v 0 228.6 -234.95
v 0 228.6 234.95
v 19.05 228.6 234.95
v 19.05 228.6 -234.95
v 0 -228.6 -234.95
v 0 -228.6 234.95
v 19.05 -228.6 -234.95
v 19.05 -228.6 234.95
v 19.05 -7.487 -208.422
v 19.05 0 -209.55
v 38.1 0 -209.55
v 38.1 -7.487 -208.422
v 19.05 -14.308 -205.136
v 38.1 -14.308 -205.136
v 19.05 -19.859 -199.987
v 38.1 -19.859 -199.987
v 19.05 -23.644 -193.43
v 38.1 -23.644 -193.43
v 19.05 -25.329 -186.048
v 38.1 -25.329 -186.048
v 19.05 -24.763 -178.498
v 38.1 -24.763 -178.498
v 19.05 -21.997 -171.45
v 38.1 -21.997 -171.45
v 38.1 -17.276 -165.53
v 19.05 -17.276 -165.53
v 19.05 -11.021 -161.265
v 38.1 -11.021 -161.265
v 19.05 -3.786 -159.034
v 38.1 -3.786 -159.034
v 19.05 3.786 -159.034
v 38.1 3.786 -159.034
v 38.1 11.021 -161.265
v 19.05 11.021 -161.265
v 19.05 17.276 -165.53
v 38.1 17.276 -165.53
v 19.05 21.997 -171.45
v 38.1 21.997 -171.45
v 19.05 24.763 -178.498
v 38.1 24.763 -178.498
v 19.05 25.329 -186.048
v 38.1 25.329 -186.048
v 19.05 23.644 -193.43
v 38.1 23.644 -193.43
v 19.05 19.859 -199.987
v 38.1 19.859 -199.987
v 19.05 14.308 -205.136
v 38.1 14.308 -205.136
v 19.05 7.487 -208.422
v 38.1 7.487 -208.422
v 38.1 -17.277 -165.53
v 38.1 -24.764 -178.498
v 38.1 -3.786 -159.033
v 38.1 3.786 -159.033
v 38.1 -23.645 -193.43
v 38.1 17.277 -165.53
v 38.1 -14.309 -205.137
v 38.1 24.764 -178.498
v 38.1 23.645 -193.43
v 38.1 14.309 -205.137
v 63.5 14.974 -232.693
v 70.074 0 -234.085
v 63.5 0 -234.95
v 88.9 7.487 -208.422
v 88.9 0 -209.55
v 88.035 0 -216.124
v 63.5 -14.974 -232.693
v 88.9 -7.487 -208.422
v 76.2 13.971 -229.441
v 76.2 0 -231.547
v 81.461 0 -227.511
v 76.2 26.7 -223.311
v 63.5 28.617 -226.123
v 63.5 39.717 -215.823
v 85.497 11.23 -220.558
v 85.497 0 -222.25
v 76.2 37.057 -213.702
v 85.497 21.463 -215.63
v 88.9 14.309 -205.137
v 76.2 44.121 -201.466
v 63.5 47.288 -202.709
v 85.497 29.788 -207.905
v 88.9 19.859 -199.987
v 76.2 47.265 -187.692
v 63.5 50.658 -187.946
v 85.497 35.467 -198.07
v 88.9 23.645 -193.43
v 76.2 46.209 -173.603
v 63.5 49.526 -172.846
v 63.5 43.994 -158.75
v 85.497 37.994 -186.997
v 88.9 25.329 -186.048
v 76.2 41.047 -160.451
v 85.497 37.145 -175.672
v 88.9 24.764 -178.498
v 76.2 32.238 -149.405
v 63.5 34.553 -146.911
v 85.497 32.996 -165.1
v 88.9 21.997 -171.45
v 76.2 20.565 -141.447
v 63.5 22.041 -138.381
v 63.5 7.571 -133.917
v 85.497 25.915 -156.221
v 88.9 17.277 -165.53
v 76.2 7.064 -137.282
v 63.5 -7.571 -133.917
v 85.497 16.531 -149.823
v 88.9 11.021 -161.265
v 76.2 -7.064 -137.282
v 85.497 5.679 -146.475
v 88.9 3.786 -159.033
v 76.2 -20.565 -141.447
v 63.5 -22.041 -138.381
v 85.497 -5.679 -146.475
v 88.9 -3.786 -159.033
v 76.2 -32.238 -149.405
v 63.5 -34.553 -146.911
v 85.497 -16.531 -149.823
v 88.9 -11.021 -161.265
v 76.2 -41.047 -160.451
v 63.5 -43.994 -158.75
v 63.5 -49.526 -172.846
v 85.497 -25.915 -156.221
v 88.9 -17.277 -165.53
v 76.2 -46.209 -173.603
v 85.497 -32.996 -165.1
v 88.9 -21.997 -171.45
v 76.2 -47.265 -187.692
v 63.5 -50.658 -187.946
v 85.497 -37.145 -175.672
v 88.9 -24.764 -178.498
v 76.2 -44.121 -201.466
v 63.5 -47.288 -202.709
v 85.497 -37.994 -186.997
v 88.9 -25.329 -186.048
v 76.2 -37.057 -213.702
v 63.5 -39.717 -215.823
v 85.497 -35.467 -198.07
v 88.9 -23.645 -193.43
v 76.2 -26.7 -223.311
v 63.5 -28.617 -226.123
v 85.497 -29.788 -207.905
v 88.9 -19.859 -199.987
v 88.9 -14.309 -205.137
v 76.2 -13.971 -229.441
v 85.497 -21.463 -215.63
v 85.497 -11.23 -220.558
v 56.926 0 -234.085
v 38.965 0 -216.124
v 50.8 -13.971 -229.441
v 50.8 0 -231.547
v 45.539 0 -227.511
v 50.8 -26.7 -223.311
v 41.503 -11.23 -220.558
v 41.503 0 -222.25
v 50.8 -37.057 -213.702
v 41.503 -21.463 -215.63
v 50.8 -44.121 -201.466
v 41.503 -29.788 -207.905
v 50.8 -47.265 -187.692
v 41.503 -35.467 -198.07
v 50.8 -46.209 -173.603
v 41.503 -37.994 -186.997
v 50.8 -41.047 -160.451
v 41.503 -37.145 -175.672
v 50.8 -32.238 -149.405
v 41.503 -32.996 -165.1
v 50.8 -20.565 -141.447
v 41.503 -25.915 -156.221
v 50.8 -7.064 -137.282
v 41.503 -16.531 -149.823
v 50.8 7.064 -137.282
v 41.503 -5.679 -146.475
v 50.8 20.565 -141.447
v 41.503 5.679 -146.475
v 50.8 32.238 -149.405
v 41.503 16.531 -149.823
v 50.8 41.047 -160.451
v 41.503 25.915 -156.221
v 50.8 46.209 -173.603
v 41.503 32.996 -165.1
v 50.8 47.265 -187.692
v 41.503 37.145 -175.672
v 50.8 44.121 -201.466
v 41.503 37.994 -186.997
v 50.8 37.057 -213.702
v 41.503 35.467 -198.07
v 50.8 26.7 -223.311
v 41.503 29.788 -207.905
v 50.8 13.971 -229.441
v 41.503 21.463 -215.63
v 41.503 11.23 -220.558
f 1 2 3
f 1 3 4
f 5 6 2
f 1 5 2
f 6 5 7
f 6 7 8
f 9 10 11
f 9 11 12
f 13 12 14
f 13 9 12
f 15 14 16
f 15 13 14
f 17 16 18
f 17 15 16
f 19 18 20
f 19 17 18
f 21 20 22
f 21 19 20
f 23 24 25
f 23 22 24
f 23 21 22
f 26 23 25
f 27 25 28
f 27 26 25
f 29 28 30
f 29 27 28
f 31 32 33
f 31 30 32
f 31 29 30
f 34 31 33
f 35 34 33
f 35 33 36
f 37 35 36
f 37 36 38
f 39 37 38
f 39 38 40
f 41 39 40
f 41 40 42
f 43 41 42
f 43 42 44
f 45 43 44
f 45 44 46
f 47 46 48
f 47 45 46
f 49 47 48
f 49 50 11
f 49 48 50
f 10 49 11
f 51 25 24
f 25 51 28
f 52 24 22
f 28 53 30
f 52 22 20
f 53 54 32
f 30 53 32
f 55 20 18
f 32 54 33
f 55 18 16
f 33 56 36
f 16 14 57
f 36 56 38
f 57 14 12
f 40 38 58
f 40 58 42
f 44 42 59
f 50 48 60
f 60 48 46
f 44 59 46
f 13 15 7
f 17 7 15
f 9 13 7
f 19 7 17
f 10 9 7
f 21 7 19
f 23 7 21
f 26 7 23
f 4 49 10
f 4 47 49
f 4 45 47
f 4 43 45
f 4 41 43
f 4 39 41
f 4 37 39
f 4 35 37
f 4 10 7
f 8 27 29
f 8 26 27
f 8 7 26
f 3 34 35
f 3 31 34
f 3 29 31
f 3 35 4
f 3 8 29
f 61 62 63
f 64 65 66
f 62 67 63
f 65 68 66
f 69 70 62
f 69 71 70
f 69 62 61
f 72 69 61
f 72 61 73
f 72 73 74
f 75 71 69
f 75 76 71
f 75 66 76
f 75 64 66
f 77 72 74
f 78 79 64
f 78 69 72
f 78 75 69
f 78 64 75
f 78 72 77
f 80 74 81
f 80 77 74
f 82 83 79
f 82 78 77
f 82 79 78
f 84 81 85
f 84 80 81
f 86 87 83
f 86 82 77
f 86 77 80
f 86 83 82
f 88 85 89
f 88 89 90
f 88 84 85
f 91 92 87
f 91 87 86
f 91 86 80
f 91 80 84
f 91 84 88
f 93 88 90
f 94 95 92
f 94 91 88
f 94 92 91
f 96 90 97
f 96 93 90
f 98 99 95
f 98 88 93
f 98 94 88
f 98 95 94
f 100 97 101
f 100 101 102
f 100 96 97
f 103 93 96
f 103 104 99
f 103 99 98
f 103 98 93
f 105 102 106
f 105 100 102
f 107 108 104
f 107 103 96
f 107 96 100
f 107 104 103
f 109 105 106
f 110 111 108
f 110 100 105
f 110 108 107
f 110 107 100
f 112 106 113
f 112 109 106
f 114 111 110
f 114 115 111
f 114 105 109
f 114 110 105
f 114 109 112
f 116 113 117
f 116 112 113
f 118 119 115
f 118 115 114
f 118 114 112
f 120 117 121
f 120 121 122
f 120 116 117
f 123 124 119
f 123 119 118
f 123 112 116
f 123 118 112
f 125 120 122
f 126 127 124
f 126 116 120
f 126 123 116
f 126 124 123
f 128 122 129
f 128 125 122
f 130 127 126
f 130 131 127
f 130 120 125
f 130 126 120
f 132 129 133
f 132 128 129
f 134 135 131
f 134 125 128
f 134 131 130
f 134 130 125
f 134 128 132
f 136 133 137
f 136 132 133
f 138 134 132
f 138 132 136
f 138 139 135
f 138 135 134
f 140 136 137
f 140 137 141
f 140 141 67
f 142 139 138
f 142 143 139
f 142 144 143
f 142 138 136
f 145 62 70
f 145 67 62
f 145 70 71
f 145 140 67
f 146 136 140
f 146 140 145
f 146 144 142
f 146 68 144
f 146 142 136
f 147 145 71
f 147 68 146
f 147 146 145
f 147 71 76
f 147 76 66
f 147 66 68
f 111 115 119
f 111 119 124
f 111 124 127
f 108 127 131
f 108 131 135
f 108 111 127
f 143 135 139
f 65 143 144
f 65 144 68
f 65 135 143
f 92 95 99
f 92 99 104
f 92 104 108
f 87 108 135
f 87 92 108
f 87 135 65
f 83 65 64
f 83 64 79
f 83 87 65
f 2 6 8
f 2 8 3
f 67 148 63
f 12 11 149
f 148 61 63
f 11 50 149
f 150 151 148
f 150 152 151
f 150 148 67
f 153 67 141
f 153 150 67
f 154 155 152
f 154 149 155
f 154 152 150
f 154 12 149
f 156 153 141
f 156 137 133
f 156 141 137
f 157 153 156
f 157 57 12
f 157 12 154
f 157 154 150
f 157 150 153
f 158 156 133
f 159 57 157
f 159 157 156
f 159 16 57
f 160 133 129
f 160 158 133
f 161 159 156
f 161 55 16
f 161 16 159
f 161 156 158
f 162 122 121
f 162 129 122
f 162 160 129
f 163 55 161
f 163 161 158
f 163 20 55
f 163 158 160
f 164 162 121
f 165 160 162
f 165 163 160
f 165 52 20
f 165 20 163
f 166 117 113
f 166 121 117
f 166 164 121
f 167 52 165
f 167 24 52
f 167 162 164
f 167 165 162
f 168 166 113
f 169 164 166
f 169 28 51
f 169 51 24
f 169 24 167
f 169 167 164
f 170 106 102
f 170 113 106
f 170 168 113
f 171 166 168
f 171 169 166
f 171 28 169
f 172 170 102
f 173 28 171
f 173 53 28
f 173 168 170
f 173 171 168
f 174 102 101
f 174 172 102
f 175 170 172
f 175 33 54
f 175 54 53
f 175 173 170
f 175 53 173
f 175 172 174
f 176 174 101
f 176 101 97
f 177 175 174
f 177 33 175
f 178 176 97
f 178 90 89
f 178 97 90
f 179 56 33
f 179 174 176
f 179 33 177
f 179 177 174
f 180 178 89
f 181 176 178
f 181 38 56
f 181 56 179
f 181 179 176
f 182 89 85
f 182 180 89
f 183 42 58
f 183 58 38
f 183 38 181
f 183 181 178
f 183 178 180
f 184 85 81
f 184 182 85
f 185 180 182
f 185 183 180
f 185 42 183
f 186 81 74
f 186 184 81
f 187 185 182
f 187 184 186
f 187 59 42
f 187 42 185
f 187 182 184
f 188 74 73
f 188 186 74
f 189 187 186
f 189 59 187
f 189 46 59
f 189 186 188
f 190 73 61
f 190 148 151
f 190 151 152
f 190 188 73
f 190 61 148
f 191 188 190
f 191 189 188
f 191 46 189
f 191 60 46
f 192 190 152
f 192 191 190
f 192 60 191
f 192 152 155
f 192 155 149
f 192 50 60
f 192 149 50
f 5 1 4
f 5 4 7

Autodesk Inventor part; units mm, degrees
ref_plane "YZ Plane" through (0, 0, 0) normal (1, 0, 0) x (0, 1, 0)
ref_plane "XZ Plane" through (0, 0, 0) normal (0, 1, 0) x (-1, 0, 0)
ref_plane "XY Plane" through (0, 0, 0) normal (0, 0, 1) x (1, 0, 0)
sketch "Sketch1" plane through (0, 0, 0) normal (1, 0, 0) x (0, 1, 0)
  line L0 (-228.6, 234.95) -> (228.6, 234.95)
  line L1 (228.6, 234.95) -> (228.6, -234.95)
  line L2 (228.6, -234.95) -> (-228.6, -234.95)
  line L3 (-228.6, -234.95) -> (-228.6, 234.95)
  line L4 (-228.6, 234.95) -> (228.6, -234.95) construction
  line L5 (228.6, 234.95) -> (-228.6, -234.95) construction
  point P0 (0, 0)
  dimension "d0" = 457.2
  dimension "d1" = 469.9
extrude "Extrusion1" add sketch "Sketch1" along normal blind 19.05
sketch "Sketch2" plane through (19.05, 0, 0) normal (1, 0, 0) x (0, 0, -1)
  circle A0 centre (184.15, 0) radius 25.4
  line L0 (234.95, -228.6) -> (234.95, 228.6) projected
  point P0 (0, 0)
  point P1 (234.95, 0)
  dimension "d4" = 50.8
  dimension "d5" = 50.8
extrude "Extrusion2" add sketch "Sketch2" along normal blind 19.05
sketch "Sketch3" plane through (38.1, 0, -184.15) normal (1, 0, 0) x (0, 0, -1)
  circle A0 centre (0, 0) radius 50.8
  line L0 (50.8, -228.6) -> (50.8, 228.6) projected
  point P0 (-184.15, 0)
  dimension "d8" = 50.8
  dimension "d9" = 101.6
extrude "Extrusion3" add sketch "Sketch3" along normal blind 50.8
fillet "Fillet1" radius 25.4 2 edges at (88.9, 0, -133.35) (38.1, 0, -133.35)
properties part number "front door (for assembly)"
